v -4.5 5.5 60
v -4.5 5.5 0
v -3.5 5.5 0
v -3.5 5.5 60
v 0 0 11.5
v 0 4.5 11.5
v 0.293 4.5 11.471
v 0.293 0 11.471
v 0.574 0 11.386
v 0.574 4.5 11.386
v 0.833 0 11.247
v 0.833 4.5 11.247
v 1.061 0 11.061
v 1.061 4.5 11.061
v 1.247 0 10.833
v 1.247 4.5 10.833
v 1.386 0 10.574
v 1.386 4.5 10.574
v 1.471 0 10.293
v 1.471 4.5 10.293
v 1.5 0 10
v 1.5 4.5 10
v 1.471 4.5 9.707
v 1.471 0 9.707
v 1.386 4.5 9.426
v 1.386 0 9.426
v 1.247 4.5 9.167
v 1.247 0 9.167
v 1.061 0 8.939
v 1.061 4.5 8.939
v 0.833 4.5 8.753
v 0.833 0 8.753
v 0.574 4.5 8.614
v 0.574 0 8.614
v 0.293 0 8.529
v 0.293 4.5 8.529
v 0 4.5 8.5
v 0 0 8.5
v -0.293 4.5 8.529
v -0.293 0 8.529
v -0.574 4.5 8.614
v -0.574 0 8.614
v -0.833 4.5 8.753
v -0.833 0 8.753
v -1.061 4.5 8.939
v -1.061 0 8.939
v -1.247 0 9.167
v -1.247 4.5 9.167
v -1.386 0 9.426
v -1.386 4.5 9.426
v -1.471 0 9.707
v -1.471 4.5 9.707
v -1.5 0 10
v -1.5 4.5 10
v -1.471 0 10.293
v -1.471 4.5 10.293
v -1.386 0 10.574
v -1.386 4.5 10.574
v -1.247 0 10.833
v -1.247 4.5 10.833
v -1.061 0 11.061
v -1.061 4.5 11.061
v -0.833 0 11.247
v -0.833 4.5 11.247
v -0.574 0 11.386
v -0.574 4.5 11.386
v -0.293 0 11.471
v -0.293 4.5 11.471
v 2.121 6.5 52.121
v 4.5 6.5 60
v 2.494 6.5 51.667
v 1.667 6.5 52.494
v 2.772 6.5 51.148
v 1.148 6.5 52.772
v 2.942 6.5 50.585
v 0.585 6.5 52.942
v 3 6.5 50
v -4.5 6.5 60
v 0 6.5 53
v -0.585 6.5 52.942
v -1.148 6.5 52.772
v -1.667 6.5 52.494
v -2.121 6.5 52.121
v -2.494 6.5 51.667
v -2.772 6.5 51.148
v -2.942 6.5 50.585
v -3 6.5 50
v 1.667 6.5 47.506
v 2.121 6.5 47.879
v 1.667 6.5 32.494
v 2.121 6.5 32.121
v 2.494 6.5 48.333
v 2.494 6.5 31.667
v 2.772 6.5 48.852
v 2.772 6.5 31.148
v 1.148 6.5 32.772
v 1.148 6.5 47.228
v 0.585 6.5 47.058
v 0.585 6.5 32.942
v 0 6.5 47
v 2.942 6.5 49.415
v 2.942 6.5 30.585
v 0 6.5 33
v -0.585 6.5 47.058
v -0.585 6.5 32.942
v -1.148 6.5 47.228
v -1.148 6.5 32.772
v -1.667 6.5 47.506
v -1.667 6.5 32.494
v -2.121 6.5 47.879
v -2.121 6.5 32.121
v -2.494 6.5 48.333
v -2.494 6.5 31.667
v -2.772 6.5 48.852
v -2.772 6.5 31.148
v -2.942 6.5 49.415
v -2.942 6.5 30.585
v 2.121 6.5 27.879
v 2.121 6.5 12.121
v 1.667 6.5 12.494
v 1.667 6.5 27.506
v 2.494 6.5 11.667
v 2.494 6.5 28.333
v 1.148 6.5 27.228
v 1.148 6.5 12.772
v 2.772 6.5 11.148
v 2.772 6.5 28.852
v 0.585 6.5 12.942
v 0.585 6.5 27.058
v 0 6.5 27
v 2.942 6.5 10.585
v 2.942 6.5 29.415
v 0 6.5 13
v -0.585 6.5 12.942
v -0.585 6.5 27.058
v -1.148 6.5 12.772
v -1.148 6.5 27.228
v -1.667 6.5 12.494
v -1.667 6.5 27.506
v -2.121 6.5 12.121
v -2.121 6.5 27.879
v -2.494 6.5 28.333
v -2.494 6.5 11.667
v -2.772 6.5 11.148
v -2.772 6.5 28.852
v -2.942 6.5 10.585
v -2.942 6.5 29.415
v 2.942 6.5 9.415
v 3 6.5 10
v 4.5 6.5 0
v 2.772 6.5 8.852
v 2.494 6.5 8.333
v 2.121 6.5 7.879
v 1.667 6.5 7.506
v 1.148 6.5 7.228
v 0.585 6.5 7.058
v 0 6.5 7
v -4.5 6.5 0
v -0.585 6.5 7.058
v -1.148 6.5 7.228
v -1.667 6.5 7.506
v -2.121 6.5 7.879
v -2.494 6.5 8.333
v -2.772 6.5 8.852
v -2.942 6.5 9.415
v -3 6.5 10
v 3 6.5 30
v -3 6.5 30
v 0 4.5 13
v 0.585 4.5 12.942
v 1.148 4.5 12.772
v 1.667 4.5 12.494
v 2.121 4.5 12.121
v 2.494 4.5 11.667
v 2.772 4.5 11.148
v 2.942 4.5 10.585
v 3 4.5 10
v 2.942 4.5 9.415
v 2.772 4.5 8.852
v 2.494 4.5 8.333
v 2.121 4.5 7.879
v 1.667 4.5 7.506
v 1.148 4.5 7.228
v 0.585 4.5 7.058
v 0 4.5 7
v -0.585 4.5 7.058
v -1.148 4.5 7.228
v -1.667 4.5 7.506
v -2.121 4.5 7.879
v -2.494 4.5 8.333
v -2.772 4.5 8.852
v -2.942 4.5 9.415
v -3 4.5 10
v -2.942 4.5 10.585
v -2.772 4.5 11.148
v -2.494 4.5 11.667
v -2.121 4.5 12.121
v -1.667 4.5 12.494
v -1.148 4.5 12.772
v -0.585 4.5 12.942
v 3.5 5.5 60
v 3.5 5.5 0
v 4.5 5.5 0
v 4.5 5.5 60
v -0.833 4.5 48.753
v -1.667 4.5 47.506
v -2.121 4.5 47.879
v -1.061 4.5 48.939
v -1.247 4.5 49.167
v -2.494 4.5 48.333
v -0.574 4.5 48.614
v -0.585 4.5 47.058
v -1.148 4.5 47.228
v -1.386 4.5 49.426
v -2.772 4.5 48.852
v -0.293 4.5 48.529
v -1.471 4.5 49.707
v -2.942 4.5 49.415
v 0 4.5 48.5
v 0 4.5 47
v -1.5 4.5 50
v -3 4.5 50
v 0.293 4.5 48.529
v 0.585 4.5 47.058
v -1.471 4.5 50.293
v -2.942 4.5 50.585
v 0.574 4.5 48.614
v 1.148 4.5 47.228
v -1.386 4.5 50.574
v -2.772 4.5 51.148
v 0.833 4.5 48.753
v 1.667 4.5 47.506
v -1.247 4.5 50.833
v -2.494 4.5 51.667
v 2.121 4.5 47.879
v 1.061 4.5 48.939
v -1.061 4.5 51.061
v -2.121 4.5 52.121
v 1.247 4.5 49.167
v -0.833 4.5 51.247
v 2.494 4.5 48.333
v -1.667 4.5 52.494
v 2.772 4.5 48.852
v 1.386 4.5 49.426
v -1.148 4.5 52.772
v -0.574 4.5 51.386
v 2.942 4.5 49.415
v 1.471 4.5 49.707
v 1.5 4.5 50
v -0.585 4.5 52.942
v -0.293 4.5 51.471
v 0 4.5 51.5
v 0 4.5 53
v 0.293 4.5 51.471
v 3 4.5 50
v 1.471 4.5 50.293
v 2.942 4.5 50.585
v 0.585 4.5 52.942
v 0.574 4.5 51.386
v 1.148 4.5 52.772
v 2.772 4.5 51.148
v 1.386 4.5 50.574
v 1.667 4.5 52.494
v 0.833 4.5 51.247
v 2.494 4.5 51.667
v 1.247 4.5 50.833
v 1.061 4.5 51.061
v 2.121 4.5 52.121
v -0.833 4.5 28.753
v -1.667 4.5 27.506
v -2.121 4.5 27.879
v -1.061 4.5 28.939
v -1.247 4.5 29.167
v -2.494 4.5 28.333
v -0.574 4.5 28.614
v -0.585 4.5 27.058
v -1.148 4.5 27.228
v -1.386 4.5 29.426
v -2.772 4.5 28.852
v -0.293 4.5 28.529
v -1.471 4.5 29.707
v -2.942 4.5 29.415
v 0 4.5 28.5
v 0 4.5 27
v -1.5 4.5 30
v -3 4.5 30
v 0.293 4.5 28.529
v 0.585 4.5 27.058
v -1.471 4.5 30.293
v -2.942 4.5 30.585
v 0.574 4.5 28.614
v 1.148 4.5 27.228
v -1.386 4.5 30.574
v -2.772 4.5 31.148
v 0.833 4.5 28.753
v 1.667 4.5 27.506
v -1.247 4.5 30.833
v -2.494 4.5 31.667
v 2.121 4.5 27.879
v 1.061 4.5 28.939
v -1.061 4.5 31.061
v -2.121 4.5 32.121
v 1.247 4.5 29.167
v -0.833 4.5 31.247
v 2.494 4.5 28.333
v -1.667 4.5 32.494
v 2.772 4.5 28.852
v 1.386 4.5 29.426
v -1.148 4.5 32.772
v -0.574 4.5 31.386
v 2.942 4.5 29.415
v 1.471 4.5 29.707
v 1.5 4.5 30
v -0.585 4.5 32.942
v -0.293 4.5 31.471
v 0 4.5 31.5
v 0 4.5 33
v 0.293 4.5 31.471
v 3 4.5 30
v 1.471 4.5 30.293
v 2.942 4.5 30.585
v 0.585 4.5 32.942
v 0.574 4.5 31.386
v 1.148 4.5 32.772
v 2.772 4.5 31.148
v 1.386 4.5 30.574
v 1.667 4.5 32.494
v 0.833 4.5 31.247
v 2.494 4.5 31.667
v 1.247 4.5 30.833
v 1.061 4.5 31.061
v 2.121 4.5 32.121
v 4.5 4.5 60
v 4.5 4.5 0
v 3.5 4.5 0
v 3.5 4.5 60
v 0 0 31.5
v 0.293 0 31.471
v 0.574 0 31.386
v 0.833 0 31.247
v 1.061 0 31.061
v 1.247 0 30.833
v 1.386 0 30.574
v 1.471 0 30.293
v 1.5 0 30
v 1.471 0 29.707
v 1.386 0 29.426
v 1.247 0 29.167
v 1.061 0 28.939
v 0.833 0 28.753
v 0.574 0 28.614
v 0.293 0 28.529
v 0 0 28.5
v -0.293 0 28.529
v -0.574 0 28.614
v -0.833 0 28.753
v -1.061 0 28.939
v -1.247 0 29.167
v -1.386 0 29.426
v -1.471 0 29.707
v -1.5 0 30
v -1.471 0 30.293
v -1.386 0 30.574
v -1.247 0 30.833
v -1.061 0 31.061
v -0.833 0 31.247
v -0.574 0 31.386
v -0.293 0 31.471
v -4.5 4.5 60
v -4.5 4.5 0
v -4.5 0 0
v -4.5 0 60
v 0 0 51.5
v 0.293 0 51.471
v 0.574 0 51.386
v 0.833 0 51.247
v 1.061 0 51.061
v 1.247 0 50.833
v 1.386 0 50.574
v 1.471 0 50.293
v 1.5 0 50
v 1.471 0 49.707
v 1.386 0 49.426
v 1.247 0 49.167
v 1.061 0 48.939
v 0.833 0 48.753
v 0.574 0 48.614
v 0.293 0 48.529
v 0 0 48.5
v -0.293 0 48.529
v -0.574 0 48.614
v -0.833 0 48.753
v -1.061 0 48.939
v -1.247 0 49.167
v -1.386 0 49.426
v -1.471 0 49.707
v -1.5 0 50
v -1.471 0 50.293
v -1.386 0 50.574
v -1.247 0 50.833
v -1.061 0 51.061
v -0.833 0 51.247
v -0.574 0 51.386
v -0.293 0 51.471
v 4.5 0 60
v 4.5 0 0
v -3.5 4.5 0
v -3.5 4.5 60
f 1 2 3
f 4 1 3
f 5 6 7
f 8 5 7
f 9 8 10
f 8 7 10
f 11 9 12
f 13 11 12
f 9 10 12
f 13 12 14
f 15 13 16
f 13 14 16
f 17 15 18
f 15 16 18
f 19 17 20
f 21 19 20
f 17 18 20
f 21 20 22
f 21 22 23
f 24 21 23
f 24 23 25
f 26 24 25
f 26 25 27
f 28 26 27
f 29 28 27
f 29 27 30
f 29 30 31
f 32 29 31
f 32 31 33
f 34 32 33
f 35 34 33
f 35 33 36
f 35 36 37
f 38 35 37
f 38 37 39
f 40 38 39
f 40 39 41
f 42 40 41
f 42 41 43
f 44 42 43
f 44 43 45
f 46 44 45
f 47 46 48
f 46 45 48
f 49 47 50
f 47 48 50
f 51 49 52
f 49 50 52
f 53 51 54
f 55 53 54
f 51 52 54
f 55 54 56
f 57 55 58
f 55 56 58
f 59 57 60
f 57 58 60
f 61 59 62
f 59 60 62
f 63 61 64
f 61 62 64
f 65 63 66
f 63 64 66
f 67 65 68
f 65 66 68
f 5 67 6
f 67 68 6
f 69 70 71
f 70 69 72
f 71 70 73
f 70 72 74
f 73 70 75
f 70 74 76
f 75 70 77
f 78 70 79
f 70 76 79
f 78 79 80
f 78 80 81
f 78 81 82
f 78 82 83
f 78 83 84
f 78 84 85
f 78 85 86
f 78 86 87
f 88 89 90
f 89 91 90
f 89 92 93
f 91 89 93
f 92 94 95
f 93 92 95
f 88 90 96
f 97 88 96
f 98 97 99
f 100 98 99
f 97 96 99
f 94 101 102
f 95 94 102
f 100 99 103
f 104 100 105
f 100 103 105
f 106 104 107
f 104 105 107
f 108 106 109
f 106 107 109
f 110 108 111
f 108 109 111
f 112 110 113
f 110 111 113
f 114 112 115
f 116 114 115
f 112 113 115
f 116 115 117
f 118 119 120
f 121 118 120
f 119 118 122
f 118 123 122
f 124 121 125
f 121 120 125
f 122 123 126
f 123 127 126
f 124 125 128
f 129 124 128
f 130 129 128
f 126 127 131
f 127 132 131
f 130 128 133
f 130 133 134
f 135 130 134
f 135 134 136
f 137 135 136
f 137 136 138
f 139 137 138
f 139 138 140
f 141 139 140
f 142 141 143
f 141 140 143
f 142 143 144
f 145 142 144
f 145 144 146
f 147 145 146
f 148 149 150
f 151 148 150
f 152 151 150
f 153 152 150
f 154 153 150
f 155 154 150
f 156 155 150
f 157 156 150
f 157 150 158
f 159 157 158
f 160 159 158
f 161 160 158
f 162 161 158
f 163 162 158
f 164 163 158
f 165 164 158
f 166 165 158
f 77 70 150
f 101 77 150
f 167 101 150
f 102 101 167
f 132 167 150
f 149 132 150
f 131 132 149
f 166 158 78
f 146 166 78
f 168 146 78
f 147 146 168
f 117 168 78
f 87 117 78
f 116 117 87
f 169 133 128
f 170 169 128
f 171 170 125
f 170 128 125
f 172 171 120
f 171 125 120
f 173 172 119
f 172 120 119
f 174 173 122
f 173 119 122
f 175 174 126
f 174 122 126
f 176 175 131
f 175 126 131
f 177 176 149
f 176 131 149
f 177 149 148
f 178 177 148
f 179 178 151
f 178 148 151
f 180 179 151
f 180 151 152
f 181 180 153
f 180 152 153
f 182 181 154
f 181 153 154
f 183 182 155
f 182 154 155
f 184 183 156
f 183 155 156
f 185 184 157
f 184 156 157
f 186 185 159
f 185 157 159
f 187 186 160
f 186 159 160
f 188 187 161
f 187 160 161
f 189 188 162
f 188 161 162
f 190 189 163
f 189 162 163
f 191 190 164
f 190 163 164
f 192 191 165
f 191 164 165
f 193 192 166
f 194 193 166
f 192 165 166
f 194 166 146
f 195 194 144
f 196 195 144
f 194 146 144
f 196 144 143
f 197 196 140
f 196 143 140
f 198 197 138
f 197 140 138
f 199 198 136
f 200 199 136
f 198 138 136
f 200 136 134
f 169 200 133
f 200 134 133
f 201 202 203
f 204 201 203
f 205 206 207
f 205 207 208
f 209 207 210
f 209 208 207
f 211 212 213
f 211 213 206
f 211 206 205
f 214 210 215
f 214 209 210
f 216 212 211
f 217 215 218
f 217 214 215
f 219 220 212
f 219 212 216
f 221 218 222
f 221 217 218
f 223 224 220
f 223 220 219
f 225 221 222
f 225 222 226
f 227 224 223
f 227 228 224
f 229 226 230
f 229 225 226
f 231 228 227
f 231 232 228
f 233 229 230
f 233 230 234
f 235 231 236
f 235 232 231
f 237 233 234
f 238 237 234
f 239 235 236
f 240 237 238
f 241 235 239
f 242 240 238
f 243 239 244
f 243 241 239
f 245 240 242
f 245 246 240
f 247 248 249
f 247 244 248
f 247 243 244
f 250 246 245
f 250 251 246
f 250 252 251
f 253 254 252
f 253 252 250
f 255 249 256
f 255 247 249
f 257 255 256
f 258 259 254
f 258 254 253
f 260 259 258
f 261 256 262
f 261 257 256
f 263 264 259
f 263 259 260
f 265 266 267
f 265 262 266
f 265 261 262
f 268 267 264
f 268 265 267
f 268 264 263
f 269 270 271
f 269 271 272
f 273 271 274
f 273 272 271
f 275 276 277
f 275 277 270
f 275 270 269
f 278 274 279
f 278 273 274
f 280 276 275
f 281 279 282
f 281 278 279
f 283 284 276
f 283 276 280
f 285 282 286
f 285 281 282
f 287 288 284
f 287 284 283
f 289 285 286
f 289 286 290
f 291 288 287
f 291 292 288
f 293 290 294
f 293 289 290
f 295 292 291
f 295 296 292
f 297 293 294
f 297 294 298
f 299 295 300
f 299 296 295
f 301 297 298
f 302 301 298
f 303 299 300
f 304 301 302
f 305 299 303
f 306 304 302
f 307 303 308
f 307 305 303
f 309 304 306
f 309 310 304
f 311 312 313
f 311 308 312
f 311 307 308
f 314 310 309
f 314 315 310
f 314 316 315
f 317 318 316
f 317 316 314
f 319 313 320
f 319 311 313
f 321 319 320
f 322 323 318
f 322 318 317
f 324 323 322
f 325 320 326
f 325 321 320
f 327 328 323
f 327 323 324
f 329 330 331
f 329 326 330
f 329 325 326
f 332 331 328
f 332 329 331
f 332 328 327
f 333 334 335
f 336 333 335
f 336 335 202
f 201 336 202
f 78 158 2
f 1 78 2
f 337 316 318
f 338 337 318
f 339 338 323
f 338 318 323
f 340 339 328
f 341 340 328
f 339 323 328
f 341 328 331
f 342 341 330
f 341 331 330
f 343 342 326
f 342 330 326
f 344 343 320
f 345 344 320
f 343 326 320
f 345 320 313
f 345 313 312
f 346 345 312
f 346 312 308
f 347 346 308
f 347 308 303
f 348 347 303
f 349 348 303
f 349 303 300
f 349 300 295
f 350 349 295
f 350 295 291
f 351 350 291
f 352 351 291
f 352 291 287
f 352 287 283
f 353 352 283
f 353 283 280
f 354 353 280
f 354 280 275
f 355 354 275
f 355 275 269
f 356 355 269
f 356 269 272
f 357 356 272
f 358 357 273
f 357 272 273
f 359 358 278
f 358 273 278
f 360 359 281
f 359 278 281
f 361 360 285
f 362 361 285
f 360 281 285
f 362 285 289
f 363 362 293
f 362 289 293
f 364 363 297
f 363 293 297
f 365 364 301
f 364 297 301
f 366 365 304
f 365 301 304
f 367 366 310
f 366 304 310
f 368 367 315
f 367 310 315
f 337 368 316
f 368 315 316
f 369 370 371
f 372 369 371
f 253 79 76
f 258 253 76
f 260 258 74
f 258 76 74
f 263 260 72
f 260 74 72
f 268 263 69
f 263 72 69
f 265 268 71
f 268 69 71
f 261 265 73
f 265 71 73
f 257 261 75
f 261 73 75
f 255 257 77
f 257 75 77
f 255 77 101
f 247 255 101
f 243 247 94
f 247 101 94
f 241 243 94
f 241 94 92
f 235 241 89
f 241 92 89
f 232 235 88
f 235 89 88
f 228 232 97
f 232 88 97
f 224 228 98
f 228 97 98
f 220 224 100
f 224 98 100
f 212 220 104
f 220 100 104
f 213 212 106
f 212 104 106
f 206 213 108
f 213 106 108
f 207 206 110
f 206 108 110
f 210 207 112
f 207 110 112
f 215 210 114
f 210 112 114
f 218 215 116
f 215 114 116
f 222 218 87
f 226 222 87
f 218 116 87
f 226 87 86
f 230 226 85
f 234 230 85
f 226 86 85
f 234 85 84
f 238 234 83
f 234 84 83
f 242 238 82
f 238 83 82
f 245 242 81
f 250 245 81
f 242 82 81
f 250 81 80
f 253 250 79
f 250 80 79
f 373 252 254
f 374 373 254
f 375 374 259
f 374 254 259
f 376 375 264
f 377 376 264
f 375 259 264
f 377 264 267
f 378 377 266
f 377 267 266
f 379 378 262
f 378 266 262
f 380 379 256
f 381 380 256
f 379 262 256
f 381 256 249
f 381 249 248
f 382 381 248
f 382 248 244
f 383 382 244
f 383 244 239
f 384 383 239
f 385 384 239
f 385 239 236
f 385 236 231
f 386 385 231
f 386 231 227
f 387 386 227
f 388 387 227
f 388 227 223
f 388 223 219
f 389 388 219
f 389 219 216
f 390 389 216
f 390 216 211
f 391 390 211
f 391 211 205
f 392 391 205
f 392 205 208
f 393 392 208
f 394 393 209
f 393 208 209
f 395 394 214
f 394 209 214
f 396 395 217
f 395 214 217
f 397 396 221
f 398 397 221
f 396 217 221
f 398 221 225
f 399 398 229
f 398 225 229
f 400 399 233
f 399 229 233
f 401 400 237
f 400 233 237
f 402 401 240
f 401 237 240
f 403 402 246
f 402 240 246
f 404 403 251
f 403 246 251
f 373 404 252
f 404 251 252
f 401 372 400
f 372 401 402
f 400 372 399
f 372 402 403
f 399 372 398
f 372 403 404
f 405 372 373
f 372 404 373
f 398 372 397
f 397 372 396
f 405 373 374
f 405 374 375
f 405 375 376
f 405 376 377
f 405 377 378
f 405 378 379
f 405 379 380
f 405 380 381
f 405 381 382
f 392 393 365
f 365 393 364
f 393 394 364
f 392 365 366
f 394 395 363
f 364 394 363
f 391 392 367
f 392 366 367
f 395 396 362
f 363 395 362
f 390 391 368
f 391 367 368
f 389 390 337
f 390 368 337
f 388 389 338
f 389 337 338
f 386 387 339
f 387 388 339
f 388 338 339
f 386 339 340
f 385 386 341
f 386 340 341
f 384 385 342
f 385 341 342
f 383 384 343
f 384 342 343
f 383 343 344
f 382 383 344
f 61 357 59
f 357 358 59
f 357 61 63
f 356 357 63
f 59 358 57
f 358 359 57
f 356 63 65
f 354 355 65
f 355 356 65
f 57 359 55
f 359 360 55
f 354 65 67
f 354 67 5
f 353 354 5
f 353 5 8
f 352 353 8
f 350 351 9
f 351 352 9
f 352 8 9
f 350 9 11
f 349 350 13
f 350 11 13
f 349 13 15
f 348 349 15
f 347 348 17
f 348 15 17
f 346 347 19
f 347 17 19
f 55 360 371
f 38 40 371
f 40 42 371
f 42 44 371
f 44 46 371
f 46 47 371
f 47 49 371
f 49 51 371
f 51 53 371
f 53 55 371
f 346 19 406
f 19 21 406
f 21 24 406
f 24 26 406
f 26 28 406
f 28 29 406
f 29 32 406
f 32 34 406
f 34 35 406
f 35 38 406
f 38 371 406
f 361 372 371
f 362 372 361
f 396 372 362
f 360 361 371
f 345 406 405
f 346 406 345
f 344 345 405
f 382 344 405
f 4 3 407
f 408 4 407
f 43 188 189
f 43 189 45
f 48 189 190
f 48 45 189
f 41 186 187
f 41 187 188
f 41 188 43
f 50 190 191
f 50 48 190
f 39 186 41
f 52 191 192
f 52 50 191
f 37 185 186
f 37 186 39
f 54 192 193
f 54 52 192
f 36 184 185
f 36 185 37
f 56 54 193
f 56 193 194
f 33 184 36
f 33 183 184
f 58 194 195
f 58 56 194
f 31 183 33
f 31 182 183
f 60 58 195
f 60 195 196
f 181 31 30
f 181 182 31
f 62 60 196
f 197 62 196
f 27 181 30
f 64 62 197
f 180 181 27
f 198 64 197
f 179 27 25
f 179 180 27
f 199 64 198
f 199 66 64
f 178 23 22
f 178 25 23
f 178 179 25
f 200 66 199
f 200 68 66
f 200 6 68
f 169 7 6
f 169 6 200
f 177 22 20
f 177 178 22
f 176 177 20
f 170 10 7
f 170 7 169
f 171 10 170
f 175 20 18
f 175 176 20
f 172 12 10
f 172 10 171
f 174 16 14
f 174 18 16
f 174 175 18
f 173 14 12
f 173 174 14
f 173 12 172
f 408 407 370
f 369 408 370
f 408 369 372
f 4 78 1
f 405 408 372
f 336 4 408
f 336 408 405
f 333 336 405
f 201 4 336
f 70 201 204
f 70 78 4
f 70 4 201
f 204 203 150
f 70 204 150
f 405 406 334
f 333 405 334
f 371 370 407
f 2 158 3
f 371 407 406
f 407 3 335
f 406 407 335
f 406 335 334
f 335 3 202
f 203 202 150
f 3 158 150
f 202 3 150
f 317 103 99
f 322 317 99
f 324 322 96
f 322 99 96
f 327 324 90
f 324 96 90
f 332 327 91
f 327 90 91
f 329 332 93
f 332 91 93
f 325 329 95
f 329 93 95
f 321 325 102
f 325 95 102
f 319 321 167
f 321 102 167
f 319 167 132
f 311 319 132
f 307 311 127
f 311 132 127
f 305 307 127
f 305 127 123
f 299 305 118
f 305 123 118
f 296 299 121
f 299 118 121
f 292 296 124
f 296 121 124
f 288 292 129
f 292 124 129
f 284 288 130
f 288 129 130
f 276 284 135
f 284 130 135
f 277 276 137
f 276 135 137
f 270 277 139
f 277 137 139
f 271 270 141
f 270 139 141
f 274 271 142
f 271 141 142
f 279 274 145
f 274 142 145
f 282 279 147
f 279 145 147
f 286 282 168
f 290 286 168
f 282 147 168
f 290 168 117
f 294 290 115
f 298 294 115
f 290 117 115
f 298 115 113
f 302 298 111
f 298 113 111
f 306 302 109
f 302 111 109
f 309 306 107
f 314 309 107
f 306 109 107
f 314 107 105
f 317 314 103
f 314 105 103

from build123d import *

# Parameters (mm, degrees)
EXTRUDE1_DEPTH = 60
SKETCH2_R      = 3
EXTRUDE2_DEPTH = 2
SKETCH3_R      = 1.5
EXTRUDE4_DEPTH = 61.336556083


with BuildPart() as part:
    # Sketch1 → Extrude1 (new body)
    with BuildSketch(Plane.XY):
        Polygon((4.5, 6.5), (-4.5, 6.5), (-4.5, 5.5), (-3.5, 5.5), (-3.5, 4.5), (-4.5, 4.5), (-4.5, 0), (4.5, 0), (4.5, 4.5), (3.5, 4.5), (3.5, 5.5), (4.5, 5.5), align=None)
    extrude(amount=EXTRUDE1_DEPTH)

    # Sketch2 → Extrude2 (cut)
    with BuildSketch(Plane(origin=(0, 6.5, 0), x_dir=(1, 0, 0), z_dir=(0, 1, 0))):
        with Locations(Location((0, -10, 0), (0, 0, 270))):
            Circle(SKETCH2_R)
        with Locations(Location((0, -30, 0), (0, 0, 270))):
            Circle(SKETCH2_R)
        with Locations(Location((0, -50, 0), (0, 0, 270))):
            Circle(SKETCH2_R)
        with Locations((0, -70)):
            Circle(SKETCH2_R)
        with Locations((0, -90)):
            Circle(SKETCH2_R)
        with Locations((0, -110)):
            Circle(SKETCH2_R)
        with Locations((0, -130)):
            Circle(SKETCH2_R)
        with Locations((0, -150)):
            Circle(SKETCH2_R)
        with Locations((0, -170)):
            Circle(SKETCH2_R)
        with Locations((0, -190)):
            Circle(SKETCH2_R)
        with Locations((0, -210)):
            Circle(SKETCH2_R)
        with Locations((0, -230)):
            Circle(SKETCH2_R)
        with Locations((0, -250)):
            Circle(SKETCH2_R)
        with Locations((0, -270)):
            Circle(SKETCH2_R)
        with Locations((0, -290)):
            Circle(SKETCH2_R)
        with Locations((0, -310)):
            Circle(SKETCH2_R)
        with Locations((0, -330)):
            Circle(SKETCH2_R)
        with Locations((0, -350)):
            Circle(SKETCH2_R)
        with Locations((0, -370)):
            Circle(SKETCH2_R)
        with Locations((0, -390)):
            Circle(SKETCH2_R)
        with Locations((0, -410)):
            Circle(SKETCH2_R)
        with Locations((0, -430)):
            Circle(SKETCH2_R)
        with Locations((0, -450)):
            Circle(SKETCH2_R)
        with Locations((0, -470)):
            Circle(SKETCH2_R)
        with Locations((0, -490)):
            Circle(SKETCH2_R)
        with Locations((0, -510)):
            Circle(SKETCH2_R)
        with Locations((0, -530)):
            Circle(SKETCH2_R)
        with Locations((0, -550)):
            Circle(SKETCH2_R)
        with Locations((0, -570)):
            Circle(SKETCH2_R)
        with Locations((0, -590)):
            Circle(SKETCH2_R)
        with Locations((0, -610)):
            Circle(SKETCH2_R)
        with Locations((0, -630)):
            Circle(SKETCH2_R)
    extrude(amount=-EXTRUDE2_DEPTH, mode=Mode.SUBTRACT)

    # Sketch3 → Extrude4 (cut, through all)
    with BuildSketch(Plane(origin=(0, 4.5, 0), x_dir=(1, 0, 0), z_dir=(0, 1, 0))):
        with Locations(Location((0, -10, 0), (0, 0, 270))):
            Circle(SKETCH3_R)
        with Locations(Location((0, -30, 0), (0, 0, 270))):
            Circle(SKETCH3_R)
        with Locations(Location((0, -50, 0), (0, 0, 270))):
            Circle(SKETCH3_R)
        with Locations((0, -70)):
            Circle(SKETCH3_R)
        with Locations((0, -90)):
            Circle(SKETCH3_R)
        with Locations((0, -110)):
            Circle(SKETCH3_R)
        with Locations((0, -130)):
            Circle(SKETCH3_R)
        with Locations((0, -150)):
            Circle(SKETCH3_R)
        with Locations((0, -170)):
            Circle(SKETCH3_R)
        with Locations((0, -190)):
            Circle(SKETCH3_R)
        with Locations((0, -210)):
            Circle(SKETCH3_R)
        with Locations((0, -230)):
            Circle(SKETCH3_R)
        with Locations((0, -250)):
            Circle(SKETCH3_R)
        with Locations((0, -270)):
            Circle(SKETCH3_R)
        with Locations((0, -290)):
            Circle(SKETCH3_R)
        with Locations((0, -310)):
            Circle(SKETCH3_R)
        with Locations((0, -330)):
            Circle(SKETCH3_R)
        with Locations((0, -350)):
            Circle(SKETCH3_R)
        with Locations((0, -370)):
            Circle(SKETCH3_R)
        with Locations((0, -390)):
            Circle(SKETCH3_R)
        with Locations((0, -410)):
            Circle(SKETCH3_R)
        with Locations((0, -430)):
            Circle(SKETCH3_R)
        with Locations((0, -450)):
            Circle(SKETCH3_R)
        with Locations((0, -470)):
            Circle(SKETCH3_R)
        with Locations((0, -490)):
            Circle(SKETCH3_R)
        with Locations((0, -510)):
            Circle(SKETCH3_R)
        with Locations((0, -530)):
            Circle(SKETCH3_R)
        with Locations((0, -550)):
            Circle(SKETCH3_R)
        with Locations((0, -570)):
            Circle(SKETCH3_R)
        with Locations((0, -590)):
            Circle(SKETCH3_R)
        with Locations((0, -610)):
            Circle(SKETCH3_R)
        with Locations((0, -630)):
            Circle(SKETCH3_R)
    extrude(amount=-EXTRUDE4_DEPTH, mode=Mode.SUBTRACT)


solid = part.part
